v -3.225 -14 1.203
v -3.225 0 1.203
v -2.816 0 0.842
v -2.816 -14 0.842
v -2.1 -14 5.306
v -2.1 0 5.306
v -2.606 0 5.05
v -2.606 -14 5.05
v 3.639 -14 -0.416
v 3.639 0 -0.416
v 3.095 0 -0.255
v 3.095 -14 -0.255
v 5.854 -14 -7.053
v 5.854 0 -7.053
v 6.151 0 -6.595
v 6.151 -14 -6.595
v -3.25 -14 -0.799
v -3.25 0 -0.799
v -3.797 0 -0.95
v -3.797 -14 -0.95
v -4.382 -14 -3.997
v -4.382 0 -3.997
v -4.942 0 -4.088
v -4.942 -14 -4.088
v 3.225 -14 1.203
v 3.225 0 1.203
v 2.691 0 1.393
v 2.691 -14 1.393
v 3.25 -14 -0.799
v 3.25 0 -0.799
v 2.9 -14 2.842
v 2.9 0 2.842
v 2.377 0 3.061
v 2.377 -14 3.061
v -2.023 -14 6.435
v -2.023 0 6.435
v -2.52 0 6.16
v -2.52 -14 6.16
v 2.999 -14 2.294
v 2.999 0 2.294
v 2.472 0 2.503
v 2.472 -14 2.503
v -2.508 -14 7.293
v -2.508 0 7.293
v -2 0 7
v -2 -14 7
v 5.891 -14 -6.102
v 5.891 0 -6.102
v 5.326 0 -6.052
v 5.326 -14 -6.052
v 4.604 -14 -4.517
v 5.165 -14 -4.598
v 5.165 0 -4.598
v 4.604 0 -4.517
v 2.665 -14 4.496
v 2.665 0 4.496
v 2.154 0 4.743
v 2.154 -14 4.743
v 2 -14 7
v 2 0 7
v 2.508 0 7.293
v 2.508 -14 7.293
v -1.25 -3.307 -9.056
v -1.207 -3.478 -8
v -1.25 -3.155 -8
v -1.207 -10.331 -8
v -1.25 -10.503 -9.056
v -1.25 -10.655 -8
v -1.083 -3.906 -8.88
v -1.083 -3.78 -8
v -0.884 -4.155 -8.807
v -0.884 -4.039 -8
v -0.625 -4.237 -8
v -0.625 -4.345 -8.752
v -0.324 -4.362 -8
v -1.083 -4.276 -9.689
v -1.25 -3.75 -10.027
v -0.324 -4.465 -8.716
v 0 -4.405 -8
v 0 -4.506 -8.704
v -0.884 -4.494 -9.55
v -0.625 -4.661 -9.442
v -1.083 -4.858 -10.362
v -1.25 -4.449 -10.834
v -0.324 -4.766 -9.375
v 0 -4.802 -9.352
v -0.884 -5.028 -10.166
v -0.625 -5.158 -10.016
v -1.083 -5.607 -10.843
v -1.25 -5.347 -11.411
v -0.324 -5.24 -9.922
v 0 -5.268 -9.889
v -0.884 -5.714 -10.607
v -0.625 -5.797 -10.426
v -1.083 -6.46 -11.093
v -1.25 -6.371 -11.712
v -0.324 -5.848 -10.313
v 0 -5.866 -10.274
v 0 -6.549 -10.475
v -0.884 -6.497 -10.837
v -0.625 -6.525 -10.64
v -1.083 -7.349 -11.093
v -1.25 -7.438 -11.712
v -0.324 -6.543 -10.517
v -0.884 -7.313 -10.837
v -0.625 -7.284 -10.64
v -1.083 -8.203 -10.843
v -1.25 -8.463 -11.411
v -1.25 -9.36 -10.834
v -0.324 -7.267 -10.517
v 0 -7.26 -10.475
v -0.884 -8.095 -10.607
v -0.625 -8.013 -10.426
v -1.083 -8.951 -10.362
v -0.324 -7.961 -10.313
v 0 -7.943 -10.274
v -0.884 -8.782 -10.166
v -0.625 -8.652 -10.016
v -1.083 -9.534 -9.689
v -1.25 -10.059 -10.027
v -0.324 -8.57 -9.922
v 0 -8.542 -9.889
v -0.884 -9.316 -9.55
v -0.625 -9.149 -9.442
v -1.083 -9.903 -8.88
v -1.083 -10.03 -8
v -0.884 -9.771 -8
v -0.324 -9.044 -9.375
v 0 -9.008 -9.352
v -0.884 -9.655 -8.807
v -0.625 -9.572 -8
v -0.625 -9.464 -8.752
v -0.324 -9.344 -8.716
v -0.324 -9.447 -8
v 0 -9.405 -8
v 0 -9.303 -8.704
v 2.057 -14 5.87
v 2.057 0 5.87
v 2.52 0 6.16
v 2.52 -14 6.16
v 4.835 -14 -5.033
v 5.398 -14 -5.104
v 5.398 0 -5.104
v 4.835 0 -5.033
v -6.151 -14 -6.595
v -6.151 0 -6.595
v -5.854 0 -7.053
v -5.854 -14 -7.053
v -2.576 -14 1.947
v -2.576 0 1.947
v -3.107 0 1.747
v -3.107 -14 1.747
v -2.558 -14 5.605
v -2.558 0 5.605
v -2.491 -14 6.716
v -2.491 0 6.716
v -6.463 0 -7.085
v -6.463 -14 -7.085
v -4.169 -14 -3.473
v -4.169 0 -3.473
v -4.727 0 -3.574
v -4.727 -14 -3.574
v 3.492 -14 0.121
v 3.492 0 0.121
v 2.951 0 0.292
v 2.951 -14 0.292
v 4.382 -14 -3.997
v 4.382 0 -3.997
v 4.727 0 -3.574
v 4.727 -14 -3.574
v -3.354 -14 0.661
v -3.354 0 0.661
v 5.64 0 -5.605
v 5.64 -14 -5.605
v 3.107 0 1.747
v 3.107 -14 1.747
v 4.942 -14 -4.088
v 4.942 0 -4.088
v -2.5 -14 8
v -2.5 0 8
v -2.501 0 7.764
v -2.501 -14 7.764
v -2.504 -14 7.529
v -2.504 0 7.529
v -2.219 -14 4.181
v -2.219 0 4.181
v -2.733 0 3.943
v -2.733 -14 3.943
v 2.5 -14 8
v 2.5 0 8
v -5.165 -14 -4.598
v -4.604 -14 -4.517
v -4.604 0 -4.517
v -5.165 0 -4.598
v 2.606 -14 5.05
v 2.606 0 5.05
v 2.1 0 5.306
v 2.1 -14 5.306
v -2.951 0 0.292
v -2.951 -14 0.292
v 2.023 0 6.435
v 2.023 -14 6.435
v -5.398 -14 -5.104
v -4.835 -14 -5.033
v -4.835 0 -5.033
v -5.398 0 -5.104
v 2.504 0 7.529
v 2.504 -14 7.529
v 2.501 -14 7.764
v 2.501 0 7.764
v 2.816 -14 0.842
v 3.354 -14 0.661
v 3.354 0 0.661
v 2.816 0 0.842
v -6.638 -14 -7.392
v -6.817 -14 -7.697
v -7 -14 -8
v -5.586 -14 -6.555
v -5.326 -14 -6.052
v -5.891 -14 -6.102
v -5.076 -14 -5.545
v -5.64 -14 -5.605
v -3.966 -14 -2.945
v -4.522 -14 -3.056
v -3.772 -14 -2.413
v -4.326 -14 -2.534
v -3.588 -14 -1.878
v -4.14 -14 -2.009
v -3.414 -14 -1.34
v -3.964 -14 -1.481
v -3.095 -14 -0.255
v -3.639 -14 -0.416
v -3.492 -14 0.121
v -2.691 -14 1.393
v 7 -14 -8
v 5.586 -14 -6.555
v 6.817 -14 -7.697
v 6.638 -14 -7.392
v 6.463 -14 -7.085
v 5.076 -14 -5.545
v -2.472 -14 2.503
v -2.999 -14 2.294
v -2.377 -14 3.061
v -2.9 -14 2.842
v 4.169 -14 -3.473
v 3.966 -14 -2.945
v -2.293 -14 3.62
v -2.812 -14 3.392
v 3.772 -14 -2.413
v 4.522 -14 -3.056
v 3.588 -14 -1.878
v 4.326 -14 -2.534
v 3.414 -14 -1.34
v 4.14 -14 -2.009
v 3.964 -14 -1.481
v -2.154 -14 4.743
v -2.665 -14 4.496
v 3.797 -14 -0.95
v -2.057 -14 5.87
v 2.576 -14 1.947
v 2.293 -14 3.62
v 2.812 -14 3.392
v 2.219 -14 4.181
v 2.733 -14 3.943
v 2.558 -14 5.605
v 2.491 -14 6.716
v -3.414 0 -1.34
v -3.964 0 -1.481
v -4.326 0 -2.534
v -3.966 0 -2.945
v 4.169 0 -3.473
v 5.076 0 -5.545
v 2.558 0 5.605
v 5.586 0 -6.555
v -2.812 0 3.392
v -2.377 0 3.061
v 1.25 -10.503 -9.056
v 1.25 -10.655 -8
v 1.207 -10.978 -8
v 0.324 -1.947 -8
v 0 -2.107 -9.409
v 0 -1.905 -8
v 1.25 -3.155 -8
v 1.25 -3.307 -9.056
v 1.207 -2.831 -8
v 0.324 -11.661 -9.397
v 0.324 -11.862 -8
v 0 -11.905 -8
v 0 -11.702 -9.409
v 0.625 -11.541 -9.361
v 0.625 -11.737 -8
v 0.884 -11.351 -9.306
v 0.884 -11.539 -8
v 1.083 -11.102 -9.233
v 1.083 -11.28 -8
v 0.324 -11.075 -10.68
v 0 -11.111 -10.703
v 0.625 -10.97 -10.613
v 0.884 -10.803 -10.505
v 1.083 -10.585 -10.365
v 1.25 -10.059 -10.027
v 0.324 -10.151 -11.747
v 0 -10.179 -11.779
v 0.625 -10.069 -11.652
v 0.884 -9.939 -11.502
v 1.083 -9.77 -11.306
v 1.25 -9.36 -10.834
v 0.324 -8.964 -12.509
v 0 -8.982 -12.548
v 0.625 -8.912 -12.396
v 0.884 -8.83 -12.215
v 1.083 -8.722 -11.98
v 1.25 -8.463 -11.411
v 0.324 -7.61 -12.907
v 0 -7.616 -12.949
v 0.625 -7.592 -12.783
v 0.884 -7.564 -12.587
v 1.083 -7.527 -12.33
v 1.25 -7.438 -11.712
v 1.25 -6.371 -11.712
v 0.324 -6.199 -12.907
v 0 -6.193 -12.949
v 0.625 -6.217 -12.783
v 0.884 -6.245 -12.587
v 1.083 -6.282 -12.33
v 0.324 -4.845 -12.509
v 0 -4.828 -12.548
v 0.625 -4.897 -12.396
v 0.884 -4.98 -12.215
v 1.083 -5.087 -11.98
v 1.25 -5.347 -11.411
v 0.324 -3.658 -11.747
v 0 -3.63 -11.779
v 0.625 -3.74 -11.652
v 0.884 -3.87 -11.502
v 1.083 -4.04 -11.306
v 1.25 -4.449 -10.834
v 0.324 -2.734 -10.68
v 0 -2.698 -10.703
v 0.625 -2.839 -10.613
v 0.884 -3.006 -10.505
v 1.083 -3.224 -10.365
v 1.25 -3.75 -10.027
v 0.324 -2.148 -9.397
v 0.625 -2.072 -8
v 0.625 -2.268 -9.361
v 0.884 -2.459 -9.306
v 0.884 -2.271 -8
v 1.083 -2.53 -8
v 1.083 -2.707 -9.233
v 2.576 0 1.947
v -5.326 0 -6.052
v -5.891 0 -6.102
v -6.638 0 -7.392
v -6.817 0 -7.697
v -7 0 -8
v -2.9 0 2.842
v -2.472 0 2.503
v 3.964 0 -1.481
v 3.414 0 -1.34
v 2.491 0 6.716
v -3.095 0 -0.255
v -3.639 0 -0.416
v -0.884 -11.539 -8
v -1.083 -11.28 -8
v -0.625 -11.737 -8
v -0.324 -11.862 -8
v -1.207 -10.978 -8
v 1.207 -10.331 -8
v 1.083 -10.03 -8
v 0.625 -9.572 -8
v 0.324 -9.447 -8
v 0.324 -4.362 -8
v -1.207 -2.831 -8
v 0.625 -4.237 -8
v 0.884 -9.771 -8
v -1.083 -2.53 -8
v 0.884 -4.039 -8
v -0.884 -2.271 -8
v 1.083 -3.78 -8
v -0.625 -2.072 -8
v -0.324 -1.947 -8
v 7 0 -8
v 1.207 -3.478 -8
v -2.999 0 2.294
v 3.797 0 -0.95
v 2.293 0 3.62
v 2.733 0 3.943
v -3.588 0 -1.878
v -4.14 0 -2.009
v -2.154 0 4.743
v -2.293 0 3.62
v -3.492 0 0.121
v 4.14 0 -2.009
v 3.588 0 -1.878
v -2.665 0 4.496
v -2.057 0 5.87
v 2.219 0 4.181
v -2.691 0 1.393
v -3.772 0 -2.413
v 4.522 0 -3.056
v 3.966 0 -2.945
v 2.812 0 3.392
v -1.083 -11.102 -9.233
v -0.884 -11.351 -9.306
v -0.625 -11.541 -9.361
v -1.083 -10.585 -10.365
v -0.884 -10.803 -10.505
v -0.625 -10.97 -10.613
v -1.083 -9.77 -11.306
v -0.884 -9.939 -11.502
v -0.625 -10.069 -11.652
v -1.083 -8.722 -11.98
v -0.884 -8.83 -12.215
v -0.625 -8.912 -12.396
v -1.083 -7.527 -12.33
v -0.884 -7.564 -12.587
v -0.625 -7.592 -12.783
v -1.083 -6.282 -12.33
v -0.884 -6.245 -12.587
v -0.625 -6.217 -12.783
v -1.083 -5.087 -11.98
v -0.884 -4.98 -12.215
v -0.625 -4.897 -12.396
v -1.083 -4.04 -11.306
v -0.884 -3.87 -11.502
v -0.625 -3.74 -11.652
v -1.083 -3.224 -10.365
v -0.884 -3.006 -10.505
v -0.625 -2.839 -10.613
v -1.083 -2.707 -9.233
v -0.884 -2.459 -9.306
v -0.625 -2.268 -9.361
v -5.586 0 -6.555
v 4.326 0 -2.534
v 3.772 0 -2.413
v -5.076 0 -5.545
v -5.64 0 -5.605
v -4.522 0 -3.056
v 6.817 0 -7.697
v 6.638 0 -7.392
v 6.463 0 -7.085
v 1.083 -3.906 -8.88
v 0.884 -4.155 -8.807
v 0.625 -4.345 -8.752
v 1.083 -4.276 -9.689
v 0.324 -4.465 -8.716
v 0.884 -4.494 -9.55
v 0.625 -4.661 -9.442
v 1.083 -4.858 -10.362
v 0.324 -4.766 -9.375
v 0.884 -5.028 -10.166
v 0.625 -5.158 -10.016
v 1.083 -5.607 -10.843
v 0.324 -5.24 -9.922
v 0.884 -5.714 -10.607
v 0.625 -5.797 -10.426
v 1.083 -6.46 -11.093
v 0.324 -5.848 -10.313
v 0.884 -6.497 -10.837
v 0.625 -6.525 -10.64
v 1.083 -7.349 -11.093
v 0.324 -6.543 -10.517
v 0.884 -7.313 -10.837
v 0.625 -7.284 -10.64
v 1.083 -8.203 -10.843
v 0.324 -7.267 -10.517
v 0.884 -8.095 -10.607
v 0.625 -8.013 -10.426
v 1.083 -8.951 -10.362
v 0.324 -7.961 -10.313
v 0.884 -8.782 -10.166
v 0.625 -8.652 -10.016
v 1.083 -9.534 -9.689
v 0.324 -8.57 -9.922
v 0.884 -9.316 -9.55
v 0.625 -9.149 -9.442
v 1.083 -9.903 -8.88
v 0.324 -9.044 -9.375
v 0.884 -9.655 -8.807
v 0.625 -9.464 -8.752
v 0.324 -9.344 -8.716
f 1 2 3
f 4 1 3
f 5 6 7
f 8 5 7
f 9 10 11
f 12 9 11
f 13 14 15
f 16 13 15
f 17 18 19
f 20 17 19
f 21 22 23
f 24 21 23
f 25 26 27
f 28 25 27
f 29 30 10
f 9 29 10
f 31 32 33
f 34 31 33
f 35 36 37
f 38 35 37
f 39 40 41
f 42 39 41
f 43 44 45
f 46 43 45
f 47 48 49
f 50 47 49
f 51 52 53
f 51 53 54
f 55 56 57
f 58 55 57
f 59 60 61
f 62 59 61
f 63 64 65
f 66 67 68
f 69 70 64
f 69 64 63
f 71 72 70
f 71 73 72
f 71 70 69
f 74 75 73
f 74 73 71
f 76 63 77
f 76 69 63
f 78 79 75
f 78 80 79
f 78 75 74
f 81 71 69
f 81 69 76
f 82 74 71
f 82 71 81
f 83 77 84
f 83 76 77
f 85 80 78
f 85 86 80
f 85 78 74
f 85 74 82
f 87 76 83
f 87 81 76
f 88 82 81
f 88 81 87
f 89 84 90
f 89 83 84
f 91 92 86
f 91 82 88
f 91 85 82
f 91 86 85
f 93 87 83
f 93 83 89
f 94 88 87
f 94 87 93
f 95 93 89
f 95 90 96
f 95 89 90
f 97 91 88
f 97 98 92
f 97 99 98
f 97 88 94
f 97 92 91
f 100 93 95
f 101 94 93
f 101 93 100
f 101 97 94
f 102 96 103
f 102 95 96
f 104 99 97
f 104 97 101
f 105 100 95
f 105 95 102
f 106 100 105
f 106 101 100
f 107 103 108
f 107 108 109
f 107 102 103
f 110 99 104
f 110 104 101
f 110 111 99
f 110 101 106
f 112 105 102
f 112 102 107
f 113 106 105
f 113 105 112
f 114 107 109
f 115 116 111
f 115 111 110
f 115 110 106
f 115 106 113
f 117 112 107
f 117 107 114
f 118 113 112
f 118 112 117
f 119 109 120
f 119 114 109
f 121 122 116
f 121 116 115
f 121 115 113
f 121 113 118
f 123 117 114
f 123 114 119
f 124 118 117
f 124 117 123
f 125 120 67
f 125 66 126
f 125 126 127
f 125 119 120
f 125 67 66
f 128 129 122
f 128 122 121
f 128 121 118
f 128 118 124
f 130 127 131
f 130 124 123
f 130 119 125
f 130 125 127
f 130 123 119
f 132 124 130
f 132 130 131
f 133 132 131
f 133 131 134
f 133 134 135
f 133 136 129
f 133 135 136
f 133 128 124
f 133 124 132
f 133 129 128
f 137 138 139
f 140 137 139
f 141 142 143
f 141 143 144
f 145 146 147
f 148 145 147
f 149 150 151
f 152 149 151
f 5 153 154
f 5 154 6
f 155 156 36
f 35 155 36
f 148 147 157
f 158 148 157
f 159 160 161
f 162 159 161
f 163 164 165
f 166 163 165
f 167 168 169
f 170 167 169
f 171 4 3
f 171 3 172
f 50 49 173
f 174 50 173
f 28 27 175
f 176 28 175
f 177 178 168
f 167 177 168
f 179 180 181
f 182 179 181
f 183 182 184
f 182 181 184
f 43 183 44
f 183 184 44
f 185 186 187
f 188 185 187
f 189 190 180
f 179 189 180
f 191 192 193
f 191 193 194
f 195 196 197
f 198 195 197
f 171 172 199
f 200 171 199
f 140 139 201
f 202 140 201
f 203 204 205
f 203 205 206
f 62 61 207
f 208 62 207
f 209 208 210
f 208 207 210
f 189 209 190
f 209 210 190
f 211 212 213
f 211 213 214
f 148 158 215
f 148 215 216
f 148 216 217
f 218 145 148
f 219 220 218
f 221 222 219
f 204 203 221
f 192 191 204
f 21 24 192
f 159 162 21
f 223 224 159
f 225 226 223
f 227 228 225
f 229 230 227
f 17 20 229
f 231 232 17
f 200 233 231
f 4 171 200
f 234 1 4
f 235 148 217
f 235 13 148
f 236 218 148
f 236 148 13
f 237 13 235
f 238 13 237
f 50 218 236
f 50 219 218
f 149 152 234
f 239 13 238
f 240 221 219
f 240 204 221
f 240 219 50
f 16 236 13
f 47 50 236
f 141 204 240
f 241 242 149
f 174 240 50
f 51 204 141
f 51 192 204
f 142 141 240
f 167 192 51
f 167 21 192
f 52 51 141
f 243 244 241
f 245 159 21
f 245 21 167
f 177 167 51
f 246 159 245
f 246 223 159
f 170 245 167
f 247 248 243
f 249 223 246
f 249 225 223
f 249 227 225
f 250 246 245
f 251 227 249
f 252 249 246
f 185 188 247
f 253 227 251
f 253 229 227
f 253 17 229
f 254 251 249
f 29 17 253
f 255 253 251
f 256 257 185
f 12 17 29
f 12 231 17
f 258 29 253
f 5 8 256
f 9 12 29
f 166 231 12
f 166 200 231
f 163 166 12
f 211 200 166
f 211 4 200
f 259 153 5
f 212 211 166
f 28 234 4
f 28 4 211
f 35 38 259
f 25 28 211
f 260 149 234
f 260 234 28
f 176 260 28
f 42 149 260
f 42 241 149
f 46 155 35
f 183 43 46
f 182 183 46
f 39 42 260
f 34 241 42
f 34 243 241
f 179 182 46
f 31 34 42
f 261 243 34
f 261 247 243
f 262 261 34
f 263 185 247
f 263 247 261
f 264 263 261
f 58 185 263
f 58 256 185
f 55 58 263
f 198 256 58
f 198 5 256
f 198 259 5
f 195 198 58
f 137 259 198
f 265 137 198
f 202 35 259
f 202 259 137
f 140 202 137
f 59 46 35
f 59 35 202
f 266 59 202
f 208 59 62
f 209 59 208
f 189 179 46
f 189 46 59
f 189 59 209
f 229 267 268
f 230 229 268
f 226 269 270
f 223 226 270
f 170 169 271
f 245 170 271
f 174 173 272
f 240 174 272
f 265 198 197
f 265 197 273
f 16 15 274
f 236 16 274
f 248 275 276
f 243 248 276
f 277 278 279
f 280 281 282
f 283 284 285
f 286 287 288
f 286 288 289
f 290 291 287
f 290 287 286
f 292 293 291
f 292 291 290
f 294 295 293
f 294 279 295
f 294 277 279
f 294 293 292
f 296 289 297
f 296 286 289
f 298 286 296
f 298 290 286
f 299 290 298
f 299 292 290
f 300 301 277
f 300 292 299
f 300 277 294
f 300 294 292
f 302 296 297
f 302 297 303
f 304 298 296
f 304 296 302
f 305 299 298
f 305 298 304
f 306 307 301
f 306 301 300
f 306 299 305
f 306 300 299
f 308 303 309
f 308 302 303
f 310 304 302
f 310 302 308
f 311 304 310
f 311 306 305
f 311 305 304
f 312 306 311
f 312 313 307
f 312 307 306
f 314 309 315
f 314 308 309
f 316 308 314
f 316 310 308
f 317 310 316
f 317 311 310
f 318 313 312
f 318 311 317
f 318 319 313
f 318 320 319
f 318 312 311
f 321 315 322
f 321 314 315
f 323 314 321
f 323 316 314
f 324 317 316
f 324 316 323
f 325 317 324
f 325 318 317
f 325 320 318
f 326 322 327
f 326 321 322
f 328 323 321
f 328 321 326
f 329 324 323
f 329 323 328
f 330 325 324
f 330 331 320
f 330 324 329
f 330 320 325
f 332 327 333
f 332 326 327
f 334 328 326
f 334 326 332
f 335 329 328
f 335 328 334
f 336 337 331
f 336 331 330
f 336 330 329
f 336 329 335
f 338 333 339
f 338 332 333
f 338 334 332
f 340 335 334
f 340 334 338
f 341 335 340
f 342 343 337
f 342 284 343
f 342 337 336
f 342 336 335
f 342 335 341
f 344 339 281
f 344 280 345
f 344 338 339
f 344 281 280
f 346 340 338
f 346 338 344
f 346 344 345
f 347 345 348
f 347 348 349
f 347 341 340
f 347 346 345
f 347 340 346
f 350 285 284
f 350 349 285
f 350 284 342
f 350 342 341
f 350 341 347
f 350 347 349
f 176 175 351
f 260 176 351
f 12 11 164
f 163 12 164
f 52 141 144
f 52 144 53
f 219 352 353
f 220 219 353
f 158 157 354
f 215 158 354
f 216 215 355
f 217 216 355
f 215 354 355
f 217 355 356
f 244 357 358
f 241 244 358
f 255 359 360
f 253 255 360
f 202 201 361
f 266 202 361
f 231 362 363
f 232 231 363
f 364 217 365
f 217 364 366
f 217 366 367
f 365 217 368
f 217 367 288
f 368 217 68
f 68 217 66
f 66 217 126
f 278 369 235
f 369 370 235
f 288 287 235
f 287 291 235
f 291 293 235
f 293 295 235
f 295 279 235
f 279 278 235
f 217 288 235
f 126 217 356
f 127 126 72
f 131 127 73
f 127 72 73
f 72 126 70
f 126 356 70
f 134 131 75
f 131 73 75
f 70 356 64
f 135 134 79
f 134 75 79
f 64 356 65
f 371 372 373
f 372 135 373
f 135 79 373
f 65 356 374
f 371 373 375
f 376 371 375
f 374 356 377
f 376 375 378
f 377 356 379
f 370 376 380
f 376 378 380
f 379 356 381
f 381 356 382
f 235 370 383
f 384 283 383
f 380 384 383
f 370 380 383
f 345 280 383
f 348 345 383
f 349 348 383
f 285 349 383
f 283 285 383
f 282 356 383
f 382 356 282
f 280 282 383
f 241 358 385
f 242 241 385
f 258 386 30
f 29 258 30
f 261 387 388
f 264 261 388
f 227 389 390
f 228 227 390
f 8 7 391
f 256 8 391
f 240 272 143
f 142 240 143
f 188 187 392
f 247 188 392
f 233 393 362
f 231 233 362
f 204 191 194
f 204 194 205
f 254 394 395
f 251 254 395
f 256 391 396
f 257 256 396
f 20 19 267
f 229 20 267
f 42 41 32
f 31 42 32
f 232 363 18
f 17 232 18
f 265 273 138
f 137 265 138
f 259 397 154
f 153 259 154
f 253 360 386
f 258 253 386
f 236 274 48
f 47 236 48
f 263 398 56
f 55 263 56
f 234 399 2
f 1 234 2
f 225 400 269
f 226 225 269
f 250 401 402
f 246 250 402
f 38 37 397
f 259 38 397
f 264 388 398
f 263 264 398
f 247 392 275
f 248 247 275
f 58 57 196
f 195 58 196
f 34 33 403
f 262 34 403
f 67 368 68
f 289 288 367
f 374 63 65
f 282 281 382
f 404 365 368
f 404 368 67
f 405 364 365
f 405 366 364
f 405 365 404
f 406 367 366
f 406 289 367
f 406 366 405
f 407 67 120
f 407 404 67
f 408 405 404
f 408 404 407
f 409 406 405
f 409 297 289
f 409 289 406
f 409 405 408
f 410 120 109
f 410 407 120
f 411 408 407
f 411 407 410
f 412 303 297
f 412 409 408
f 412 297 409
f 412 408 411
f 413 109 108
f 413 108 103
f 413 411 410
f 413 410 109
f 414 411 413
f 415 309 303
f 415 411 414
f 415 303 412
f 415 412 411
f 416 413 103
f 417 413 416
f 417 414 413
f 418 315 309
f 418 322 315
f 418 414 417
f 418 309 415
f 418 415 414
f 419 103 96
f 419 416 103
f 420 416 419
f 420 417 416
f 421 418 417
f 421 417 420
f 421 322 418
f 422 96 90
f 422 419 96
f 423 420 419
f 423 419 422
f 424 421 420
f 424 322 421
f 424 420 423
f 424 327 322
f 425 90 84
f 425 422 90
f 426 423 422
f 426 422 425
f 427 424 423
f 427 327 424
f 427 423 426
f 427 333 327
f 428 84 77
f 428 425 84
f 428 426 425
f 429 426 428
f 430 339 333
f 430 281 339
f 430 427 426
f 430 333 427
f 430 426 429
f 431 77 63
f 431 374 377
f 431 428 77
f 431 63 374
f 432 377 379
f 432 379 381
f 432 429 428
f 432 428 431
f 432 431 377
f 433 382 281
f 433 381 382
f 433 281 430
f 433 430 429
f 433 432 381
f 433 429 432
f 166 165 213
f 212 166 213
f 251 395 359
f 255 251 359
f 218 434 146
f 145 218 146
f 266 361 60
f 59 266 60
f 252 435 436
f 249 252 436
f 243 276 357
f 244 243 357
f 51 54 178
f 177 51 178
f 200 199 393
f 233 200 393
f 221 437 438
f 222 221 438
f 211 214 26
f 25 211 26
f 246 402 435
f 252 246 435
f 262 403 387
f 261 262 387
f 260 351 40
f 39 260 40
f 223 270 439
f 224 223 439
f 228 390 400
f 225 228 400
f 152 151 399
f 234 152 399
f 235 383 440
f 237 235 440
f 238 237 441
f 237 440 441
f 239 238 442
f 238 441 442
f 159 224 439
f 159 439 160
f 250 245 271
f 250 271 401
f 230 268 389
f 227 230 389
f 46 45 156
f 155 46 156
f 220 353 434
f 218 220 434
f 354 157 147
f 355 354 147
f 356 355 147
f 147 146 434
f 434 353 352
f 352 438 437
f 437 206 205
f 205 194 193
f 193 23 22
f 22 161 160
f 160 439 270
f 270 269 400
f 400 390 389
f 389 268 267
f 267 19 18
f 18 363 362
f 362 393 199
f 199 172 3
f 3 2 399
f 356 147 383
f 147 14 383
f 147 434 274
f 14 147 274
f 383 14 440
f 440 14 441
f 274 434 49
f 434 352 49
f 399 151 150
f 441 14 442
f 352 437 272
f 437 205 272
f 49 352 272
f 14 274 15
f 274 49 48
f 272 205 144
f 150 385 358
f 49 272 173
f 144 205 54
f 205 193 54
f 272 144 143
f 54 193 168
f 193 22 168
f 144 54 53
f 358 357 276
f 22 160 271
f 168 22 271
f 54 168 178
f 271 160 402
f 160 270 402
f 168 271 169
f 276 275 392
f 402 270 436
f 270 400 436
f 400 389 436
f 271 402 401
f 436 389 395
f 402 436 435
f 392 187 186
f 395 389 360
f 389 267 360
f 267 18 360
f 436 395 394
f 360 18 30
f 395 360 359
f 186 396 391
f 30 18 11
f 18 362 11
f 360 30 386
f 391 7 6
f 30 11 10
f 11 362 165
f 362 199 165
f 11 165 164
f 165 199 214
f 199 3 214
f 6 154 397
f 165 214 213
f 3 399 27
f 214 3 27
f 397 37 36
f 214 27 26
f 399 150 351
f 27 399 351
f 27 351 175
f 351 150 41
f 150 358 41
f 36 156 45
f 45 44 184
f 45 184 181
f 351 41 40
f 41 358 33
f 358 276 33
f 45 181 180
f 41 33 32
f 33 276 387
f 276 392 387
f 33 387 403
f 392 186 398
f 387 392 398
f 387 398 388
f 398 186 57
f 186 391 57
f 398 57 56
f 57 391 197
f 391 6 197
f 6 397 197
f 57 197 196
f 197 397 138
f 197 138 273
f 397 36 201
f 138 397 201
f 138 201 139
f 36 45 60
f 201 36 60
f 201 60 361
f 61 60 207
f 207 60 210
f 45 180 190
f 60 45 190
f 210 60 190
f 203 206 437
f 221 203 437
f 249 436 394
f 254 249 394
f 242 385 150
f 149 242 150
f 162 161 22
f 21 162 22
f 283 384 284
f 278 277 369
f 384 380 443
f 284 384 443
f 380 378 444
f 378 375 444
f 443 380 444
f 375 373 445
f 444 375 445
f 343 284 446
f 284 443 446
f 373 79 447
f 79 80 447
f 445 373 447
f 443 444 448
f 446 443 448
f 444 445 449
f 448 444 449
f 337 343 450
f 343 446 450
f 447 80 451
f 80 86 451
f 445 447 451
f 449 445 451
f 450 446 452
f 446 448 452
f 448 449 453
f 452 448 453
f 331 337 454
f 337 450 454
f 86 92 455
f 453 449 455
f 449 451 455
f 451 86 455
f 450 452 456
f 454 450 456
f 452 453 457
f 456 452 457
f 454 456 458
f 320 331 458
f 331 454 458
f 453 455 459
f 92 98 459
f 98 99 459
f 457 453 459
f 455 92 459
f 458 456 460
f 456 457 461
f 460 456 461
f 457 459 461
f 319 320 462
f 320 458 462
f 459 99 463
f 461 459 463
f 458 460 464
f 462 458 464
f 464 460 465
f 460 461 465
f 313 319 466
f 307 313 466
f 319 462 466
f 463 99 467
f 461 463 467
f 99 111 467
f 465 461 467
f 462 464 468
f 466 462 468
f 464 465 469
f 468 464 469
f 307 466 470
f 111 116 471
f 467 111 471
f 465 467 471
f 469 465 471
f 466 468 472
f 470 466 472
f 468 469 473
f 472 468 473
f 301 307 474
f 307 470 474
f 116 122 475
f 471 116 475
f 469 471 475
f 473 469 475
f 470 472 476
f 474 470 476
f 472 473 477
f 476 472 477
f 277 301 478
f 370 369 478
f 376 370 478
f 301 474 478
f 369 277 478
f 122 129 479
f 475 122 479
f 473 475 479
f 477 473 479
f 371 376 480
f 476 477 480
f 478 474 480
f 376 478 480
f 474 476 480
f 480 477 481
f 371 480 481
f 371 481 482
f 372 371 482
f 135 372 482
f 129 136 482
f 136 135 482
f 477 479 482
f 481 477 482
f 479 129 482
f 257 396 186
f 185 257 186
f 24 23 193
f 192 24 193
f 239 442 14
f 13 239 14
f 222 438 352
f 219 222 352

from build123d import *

# Parameters (mm, degrees)
F1_DEPTH = 14
F3_DEPTH = 1.25
F4_R     = 1.24999


# Not quite as in the source:
# - a fillet or chamfer is up to 0.001 mm smaller than in the source, because OpenCascade refuses the exact size


with BuildPart() as f1:
    # F0 (on Front) → F1 (new body)
    with BuildSketch(Plane.XZ):
        with BuildLine():
            Line((0, 8), (0, -8))
            Line((0, -8), (7, -8))
            ThreePointArc((7, -8), (6.7273087271, -7.5447627069), (6.462528291, -7.0848791956))
            Line((6.462528291, -7.0848791956), (5.8539806535, -7.0529865653))
            Line((5.8539806535, -7.0529865653), (6.1514320159, -6.5949516339))
            Line((6.1514320159, -6.5949516339), (5.5856572031, -6.5550071363))
            Line((5.5856572031, -6.5550071363), (5.8913609435, -6.1024383189))
            Line((5.8913609435, -6.1024383189), (5.326402994, -6.0522465166))
            Line((5.326402994, -6.0522465166), (5.6402586914, -5.605292478))
            Line((5.6402586914, -5.605292478), (5.0763031889, -5.5448698584))
            Line((5.0763031889, -5.5448698584), (5.3982077445, -5.1036774191))
            Line((5.3982077445, -5.1036774191), (4.8354399434, -5.0330438306))
            Line((4.8354399434, -5.0330438306), (5.1652876144, -4.5977579185))
            Line((5.1652876144, -4.5977579185), (4.603892379, -4.5169365636))
            Line((4.603892379, -4.5169365636), (4.9415748133, -4.087700166))
            Line((4.9415748133, -4.087700166), (4.3817365569, -3.9967175939))
            Line((4.3817365569, -3.9967175939), (4.7271428288, -3.5736717114))
            Line((4.7271428288, -3.5736717114), (4.1690454534, -3.4725578088))
            Line((4.1690454534, -3.4725578088), (4.5220621001, -3.0558414082))
            Line((4.5220621001, -3.0558414082), (3.9658889357, -2.9446293904))
            Line((3.9658889357, -2.9446293904), (4.3263999942, -2.5343793592))
            Line((4.3263999942, -2.5343793592), (3.7723337388, -2.4131057583))
            Line((3.7723337388, -2.4131057583), (4.1402207845, -2.0094568602))
            Line((4.1402207845, -2.0094568602), (3.5884434439, -1.8781615134))
            Line((3.5884434439, -1.8781615134), (3.9635856292, -1.4812463433))
            Line((3.9635856292, -1.4812463433), (3.4142784574, -1.3399723801))
            Line((3.4142784574, -1.3399723801), (3.7965525514, -0.9499213213))
            Line((3.7965525514, -0.9499213213), (3.2498959909, -0.7987151488))
            Line((3.2498959909, -0.7987151488), (3.6391764199, -0.4156563295))
            Line((3.6391764199, -0.4156563295), (3.0953500426, -0.2545676177))
            Line((3.0953500426, -0.2545676177), (3.4915089314, 0.1213731306))
            Line((3.4915089314, 0.1213731306), (2.9506913795, 0.2922914656))
            Line((2.9506913795, 0.2922914656), (3.3535985934, 0.6609906496))
            Line((3.3535985934, 0.6609906496), (2.8159675207, 0.8416824626))
            Line((2.8159675207, 0.8416824626), (3.2254907083, 1.203018968))
            Line((3.2254907083, 1.203018968), (2.6912227217, 1.3934249033))
            Line((2.6912227217, 1.3934249033), (3.1072273582, 1.7472800342))
            Line((3.1072273582, 1.7472800342), (2.5764979601, 1.9473375451))
            Line((2.5764979601, 1.9473375451), (2.9988473918, 2.2935950634))
            Line((2.9988473918, 2.2935950634), (2.4718309221, 2.5032384328))
            Line((2.4718309221, 2.5032384328), (2.9003864108, 2.8417845957))
            Line((2.9003864108, 2.8417845957), (2.3772559897, 3.0609449576))
            Line((2.3772559897, 3.0609449576), (2.8118767588, 3.3916685559))
            Line((2.8118767588, 3.3916685559), (2.2928042301, 3.6202739181))
            Line((2.2928042301, 3.6202739181), (2.7333475104, 3.9430663119))
            Line((2.7333475104, 3.9430663119), (2.2185033848, 4.1810415796))
            Line((2.2185033848, 4.1810415796), (2.6648244619, 4.4957967344))
            Line((2.6648244619, 4.4957967344), (2.1543778611, 4.7430637348))
            Line((2.1543778611, 4.7430637348), (2.6063301224, 5.0496782564))
            Line((2.6063301224, 5.0496782564), (2.1004487236, 5.3061557644))
            Line((2.1004487236, 5.3061557644), (2.5578837068, 5.6045289327))
            Line((2.5578837068, 5.6045289327), (2.0567336876, 5.8701326978))
            Line((2.0567336876, 5.8701326978), (2.5195011293, 6.1601664998))
            Line((2.5195011293, 6.1601664998), (2.0232471131, 6.4348092734))
            Line((2.0232471131, 6.4348092734), (2.4911949982, 6.7164084356))
            Line((2.4911949982, 6.7164084356), (2, 7))
            Line((2, 7), (2.5081348332, 7.2933717827))
            ThreePointArc((2.5081348332, 7.2933717827), (2.5020337704, 7.6466624796), (2.5, 8))
            Line((2.5, 8), (0, 8))
        make_face()
        with BuildLine():
            ThreePointArc((-6.462528291, -7.0848791956), (-6.7273087271, -7.5447627069), (-7, -8))
            Line((-7, -8), (0, -8))
            Line((0, -8), (0, 8))
            Line((0, 8), (-2.5, 8))
            ThreePointArc((-2.5, 8), (-2.5020337704, 7.6466624796), (-2.5081348332, 7.2933717827))
            Line((-2.5081348332, 7.2933717827), (-2, 7))
            Line((-2, 7), (-2.4911949982, 6.7164084356))
            Line((-2.4911949982, 6.7164084356), (-2.0232471131, 6.4348092734))
            Line((-2.0232471131, 6.4348092734), (-2.5195011293, 6.1601664998))
            Line((-2.5195011293, 6.1601664998), (-2.0567336876, 5.8701326978))
            Line((-2.0567336876, 5.8701326978), (-2.5578837068, 5.6045289327))
            Line((-2.5578837068, 5.6045289327), (-2.1004487236, 5.3061557644))
            Line((-2.1004487236, 5.3061557644), (-2.6063301224, 5.0496782564))
            Line((-2.6063301224, 5.0496782564), (-2.1543778611, 4.7430637348))
            Line((-2.1543778611, 4.7430637348), (-2.6648244619, 4.4957967344))
            Line((-2.6648244619, 4.4957967344), (-2.2185033848, 4.1810415796))
            Line((-2.2185033848, 4.1810415796), (-2.7333475104, 3.9430663119))
            Line((-2.7333475104, 3.9430663119), (-2.2928042301, 3.6202739181))
            Line((-2.2928042301, 3.6202739181), (-2.8118767588, 3.3916685559))
            Line((-2.8118767588, 3.3916685559), (-2.3772559897, 3.0609449576))
            Line((-2.3772559897, 3.0609449576), (-2.9003864108, 2.8417845957))
            Line((-2.9003864108, 2.8417845957), (-2.4718309221, 2.5032384328))
            Line((-2.4718309221, 2.5032384328), (-2.9988473918, 2.2935950634))
            Line((-2.9988473918, 2.2935950634), (-2.5764979601, 1.9473375451))
            Line((-2.5764979601, 1.9473375451), (-3.1072273582, 1.7472800342))
            Line((-3.1072273582, 1.7472800342), (-2.6912227217, 1.3934249033))
            Line((-2.6912227217, 1.3934249033), (-3.2254907083, 1.203018968))
            Line((-3.2254907083, 1.203018968), (-2.8159675207, 0.8416824626))
            Line((-2.8159675207, 0.8416824626), (-3.3535985934, 0.6609906496))
            Line((-3.3535985934, 0.6609906496), (-2.9506913795, 0.2922914656))
            Line((-2.9506913795, 0.2922914656), (-3.4915089314, 0.1213731306))
            Line((-3.4915089314, 0.1213731306), (-3.0953500426, -0.2545676177))
            Line((-3.0953500426, -0.2545676177), (-3.6391764199, -0.4156563295))
            Line((-3.6391764199, -0.4156563295), (-3.2498959909, -0.7987151488))
            Line((-3.2498959909, -0.7987151488), (-3.7965525514, -0.9499213213))
            Line((-3.7965525514, -0.9499213213), (-3.4142784574, -1.3399723801))
            Line((-3.4142784574, -1.3399723801), (-3.9635856292, -1.4812463433))
            Line((-3.9635856292, -1.4812463433), (-3.5884434439, -1.8781615134))
            Line((-3.5884434439, -1.8781615134), (-4.1402207845, -2.0094568602))
            Line((-4.1402207845, -2.0094568602), (-3.7723337388, -2.4131057583))
            Line((-3.7723337388, -2.4131057583), (-4.3263999942, -2.5343793592))
            Line((-4.3263999942, -2.5343793592), (-3.9658889357, -2.9446293904))
            Line((-3.9658889357, -2.9446293904), (-4.5220621001, -3.0558414082))
            Line((-4.5220621001, -3.0558414082), (-4.1690454534, -3.4725578088))
            Line((-4.1690454534, -3.4725578088), (-4.7271428288, -3.5736717114))
            Line((-4.7271428288, -3.5736717114), (-4.3817365569, -3.9967175939))
            Line((-4.3817365569, -3.9967175939), (-4.9415748133, -4.087700166))
            Line((-4.9415748133, -4.087700166), (-4.603892379, -4.5169365636))
            Line((-4.603892379, -4.5169365636), (-5.1652876144, -4.5977579185))
            Line((-5.1652876144, -4.5977579185), (-4.8354399434, -5.0330438306))
            Line((-4.8354399434, -5.0330438306), (-5.3982077445, -5.1036774191))
            Line((-5.3982077445, -5.1036774191), (-5.0763031889, -5.5448698584))
            Line((-5.0763031889, -5.5448698584), (-5.6402586914, -5.605292478))
            Line((-5.6402586914, -5.605292478), (-5.326402994, -6.0522465166))
            Line((-5.326402994, -6.0522465166), (-5.8913609435, -6.1024383189))
            Line((-5.8913609435, -6.1024383189), (-5.5856572031, -6.5550071363))
            Line((-5.5856572031, -6.5550071363), (-6.1514320159, -6.5949516339))
            Line((-6.1514320159, -6.5949516339), (-5.8539806535, -7.0529865653))
            Line((-5.8539806535, -7.0529865653), (-6.462528291, -7.0848791956))
        make_face()
    extrude(amount=F1_DEPTH)

    # F2 (on Right) → F3 (join, symmetric)
    with BuildSketch(Plane.YZ):
        with BuildLine():
            Line((-9.4047106404, -8), (-11.9047106404, -8))
            ThreePointArc((-11.9047106404, -8), (-6.9047106404, -13), (-1.9047106404, -8))
            Line((-1.9047106404, -8), (-4.4047106404, -8))
            ThreePointArc((-4.4047106404, -8), (-6.9047106404, -10.5), (-9.4047106404, -8))
        make_face()
    extrude(amount=F3_DEPTH, both=True)

    # F4 (radius 1.25 in the source; OpenCascade refuses exactly that, so slightly less here)
    f4_edges = [f1.edges().sort_by_distance(p)[0] for p in [
        (1.25, -6.904711, -13),
        (-1.25, -6.904711, -13),
        (1.25, -6.904711, -10.5),
        (-1.25, -6.904711, -10.5),
    ]]
    fillet(f4_edges, radius=F4_R)


solid = f1.part
